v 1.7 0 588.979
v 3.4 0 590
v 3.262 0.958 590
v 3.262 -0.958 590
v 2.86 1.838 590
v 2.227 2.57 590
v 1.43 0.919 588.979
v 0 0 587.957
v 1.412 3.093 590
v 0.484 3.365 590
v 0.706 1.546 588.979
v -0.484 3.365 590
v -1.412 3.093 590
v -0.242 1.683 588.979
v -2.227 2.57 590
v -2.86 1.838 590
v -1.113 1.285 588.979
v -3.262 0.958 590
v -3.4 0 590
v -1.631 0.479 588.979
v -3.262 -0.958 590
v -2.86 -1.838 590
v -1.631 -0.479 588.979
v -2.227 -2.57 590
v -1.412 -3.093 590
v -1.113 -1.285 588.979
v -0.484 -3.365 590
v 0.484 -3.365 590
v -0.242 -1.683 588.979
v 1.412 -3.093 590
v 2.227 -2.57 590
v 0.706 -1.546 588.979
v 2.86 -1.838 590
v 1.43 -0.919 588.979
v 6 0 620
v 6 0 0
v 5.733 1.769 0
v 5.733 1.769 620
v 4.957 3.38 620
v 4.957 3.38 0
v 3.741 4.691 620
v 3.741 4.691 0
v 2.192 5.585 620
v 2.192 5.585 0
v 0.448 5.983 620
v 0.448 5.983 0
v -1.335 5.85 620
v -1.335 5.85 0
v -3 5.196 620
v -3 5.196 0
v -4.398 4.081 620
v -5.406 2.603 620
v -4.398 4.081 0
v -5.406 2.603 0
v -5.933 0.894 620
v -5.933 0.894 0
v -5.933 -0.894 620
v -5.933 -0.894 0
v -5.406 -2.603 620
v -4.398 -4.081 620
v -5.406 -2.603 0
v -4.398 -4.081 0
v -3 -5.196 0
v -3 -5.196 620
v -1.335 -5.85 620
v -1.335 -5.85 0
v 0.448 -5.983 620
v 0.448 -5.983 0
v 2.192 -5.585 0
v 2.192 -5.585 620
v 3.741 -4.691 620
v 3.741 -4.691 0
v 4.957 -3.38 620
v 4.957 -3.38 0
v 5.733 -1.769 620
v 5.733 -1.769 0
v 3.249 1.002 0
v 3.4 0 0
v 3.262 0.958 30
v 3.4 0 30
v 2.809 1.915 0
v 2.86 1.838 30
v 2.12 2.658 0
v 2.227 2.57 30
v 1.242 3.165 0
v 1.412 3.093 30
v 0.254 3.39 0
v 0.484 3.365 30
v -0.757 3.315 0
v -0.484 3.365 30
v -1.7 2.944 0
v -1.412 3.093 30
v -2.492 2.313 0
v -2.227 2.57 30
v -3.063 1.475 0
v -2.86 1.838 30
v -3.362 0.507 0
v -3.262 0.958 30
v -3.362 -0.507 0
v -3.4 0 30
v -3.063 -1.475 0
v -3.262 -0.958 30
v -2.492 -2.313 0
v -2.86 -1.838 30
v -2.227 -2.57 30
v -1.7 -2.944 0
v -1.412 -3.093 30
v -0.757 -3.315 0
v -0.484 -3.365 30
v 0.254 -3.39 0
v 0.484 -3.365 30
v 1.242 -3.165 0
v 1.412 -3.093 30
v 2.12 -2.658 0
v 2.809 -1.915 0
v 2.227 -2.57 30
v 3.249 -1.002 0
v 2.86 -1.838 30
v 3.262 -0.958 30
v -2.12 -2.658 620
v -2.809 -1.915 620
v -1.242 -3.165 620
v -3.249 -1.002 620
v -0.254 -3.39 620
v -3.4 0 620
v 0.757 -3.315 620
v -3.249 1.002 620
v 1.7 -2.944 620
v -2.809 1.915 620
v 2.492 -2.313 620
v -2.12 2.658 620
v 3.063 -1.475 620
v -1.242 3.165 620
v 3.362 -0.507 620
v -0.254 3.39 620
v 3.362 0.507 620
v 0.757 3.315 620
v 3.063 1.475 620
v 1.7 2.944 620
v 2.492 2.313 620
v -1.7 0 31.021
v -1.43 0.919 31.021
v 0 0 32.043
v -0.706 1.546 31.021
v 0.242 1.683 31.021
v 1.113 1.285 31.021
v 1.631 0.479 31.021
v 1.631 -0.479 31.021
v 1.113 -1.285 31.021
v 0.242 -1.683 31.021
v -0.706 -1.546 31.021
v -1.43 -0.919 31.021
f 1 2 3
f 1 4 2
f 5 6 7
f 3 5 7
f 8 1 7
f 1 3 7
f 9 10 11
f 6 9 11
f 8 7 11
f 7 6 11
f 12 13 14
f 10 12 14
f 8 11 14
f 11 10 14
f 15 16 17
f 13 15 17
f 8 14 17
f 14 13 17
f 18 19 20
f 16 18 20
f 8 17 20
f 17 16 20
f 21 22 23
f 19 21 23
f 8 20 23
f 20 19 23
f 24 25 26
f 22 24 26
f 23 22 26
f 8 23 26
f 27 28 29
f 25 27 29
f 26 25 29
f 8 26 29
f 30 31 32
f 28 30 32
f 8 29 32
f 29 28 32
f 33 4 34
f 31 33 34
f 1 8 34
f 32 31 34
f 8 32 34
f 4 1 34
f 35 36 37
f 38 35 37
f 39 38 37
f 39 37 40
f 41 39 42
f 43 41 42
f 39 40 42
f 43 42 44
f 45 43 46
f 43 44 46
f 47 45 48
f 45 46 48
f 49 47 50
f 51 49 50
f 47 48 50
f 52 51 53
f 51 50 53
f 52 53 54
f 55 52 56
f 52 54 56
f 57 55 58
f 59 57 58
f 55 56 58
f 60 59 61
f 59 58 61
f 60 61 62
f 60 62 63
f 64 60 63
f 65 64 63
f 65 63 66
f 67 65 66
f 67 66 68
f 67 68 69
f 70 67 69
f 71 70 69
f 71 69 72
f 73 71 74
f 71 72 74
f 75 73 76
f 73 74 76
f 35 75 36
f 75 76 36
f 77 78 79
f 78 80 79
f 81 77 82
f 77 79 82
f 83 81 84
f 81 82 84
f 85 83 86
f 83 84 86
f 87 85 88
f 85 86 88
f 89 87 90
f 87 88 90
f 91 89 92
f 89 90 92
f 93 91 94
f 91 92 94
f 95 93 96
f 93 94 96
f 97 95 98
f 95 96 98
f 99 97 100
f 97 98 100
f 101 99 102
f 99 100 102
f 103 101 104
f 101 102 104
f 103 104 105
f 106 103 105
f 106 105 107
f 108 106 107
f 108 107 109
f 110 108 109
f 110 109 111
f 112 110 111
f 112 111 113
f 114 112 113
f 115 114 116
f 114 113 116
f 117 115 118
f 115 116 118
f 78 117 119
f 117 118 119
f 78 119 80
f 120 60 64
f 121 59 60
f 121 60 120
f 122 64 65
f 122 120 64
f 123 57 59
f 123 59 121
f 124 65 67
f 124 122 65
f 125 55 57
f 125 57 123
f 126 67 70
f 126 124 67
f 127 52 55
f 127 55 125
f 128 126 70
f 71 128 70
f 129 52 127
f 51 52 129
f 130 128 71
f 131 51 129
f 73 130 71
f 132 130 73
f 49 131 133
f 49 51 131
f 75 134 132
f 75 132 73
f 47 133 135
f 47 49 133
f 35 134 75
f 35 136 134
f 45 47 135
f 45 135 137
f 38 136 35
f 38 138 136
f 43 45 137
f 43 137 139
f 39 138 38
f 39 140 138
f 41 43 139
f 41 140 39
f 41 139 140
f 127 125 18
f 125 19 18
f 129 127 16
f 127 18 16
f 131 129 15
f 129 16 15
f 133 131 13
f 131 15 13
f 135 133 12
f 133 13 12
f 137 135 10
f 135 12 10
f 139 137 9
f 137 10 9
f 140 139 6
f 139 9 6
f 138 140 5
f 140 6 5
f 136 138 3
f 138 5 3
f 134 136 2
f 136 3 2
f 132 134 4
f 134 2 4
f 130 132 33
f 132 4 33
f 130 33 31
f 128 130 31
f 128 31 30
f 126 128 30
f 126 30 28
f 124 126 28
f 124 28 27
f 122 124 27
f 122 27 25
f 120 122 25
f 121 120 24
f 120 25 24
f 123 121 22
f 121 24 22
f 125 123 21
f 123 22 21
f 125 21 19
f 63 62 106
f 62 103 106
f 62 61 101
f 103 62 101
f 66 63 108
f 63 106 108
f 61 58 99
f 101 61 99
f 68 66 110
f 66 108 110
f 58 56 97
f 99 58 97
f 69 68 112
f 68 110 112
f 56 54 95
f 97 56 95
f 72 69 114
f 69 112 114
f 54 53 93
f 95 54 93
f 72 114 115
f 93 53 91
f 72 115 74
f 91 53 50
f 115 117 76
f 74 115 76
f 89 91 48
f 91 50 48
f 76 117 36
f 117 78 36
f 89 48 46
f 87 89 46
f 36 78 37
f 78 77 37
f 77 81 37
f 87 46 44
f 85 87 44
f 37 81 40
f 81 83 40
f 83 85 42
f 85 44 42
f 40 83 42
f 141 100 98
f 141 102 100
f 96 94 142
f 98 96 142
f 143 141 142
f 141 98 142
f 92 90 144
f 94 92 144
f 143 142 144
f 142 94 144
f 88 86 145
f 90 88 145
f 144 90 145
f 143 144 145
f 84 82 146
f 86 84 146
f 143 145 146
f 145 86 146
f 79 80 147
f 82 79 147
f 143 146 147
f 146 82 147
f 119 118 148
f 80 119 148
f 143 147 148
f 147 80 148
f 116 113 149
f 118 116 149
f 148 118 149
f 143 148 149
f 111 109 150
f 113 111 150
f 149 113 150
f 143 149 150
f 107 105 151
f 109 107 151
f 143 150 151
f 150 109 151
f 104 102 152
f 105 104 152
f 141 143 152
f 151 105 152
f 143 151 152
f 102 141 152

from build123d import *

# Parameters (mm, degrees)
CROQUIS1_R                = 6
SALIENTE_EXTRUIR1_DEPTH   = 620
TALADRO_ROSCADO_M81_D     = 6.8
TALADRO_ROSCADO_M81_DEPTH = 30
TALADRO_ROSCADO_M81_TIP   = 2.042926105
TALADRO_ROSCADO_M82_D     = 6.8
TALADRO_ROSCADO_M82_DEPTH = 30
TALADRO_ROSCADO_M82_TIP   = 2.042926105


with BuildPart() as part:
    # Croquis1 → Saliente-Extruir1 (new body)
    with BuildSketch(Plane.XY):
        Circle(CROQUIS1_R)
    extrude(amount=SALIENTE_EXTRUIR1_DEPTH)

    # Taladro roscado M81
    with Locations(Plane.XY.offset(620)):
        with Locations((0, 0)):
            Hole(TALADRO_ROSCADO_M81_D / 2, depth=TALADRO_ROSCADO_M81_DEPTH)
            with Locations((0, 0, -(TALADRO_ROSCADO_M81_DEPTH + TALADRO_ROSCADO_M81_TIP / 2))):  # 118° drill point
                Cone(0, TALADRO_ROSCADO_M81_D / 2, TALADRO_ROSCADO_M81_TIP, mode=Mode.SUBTRACT)

    # Taladro roscado M82
    with Locations(Plane(origin=(0, 0, 0), x_dir=(-1, 0, 0), z_dir=(0, 0, -1))):
        with Locations((0, 0)):
            Hole(TALADRO_ROSCADO_M82_D / 2, depth=TALADRO_ROSCADO_M82_DEPTH)
            with Locations((0, 0, -(TALADRO_ROSCADO_M82_DEPTH + TALADRO_ROSCADO_M82_TIP / 2))):  # 118° drill point
                Cone(0, TALADRO_ROSCADO_M82_D / 2, TALADRO_ROSCADO_M82_TIP, mode=Mode.SUBTRACT)


solid = part.part
